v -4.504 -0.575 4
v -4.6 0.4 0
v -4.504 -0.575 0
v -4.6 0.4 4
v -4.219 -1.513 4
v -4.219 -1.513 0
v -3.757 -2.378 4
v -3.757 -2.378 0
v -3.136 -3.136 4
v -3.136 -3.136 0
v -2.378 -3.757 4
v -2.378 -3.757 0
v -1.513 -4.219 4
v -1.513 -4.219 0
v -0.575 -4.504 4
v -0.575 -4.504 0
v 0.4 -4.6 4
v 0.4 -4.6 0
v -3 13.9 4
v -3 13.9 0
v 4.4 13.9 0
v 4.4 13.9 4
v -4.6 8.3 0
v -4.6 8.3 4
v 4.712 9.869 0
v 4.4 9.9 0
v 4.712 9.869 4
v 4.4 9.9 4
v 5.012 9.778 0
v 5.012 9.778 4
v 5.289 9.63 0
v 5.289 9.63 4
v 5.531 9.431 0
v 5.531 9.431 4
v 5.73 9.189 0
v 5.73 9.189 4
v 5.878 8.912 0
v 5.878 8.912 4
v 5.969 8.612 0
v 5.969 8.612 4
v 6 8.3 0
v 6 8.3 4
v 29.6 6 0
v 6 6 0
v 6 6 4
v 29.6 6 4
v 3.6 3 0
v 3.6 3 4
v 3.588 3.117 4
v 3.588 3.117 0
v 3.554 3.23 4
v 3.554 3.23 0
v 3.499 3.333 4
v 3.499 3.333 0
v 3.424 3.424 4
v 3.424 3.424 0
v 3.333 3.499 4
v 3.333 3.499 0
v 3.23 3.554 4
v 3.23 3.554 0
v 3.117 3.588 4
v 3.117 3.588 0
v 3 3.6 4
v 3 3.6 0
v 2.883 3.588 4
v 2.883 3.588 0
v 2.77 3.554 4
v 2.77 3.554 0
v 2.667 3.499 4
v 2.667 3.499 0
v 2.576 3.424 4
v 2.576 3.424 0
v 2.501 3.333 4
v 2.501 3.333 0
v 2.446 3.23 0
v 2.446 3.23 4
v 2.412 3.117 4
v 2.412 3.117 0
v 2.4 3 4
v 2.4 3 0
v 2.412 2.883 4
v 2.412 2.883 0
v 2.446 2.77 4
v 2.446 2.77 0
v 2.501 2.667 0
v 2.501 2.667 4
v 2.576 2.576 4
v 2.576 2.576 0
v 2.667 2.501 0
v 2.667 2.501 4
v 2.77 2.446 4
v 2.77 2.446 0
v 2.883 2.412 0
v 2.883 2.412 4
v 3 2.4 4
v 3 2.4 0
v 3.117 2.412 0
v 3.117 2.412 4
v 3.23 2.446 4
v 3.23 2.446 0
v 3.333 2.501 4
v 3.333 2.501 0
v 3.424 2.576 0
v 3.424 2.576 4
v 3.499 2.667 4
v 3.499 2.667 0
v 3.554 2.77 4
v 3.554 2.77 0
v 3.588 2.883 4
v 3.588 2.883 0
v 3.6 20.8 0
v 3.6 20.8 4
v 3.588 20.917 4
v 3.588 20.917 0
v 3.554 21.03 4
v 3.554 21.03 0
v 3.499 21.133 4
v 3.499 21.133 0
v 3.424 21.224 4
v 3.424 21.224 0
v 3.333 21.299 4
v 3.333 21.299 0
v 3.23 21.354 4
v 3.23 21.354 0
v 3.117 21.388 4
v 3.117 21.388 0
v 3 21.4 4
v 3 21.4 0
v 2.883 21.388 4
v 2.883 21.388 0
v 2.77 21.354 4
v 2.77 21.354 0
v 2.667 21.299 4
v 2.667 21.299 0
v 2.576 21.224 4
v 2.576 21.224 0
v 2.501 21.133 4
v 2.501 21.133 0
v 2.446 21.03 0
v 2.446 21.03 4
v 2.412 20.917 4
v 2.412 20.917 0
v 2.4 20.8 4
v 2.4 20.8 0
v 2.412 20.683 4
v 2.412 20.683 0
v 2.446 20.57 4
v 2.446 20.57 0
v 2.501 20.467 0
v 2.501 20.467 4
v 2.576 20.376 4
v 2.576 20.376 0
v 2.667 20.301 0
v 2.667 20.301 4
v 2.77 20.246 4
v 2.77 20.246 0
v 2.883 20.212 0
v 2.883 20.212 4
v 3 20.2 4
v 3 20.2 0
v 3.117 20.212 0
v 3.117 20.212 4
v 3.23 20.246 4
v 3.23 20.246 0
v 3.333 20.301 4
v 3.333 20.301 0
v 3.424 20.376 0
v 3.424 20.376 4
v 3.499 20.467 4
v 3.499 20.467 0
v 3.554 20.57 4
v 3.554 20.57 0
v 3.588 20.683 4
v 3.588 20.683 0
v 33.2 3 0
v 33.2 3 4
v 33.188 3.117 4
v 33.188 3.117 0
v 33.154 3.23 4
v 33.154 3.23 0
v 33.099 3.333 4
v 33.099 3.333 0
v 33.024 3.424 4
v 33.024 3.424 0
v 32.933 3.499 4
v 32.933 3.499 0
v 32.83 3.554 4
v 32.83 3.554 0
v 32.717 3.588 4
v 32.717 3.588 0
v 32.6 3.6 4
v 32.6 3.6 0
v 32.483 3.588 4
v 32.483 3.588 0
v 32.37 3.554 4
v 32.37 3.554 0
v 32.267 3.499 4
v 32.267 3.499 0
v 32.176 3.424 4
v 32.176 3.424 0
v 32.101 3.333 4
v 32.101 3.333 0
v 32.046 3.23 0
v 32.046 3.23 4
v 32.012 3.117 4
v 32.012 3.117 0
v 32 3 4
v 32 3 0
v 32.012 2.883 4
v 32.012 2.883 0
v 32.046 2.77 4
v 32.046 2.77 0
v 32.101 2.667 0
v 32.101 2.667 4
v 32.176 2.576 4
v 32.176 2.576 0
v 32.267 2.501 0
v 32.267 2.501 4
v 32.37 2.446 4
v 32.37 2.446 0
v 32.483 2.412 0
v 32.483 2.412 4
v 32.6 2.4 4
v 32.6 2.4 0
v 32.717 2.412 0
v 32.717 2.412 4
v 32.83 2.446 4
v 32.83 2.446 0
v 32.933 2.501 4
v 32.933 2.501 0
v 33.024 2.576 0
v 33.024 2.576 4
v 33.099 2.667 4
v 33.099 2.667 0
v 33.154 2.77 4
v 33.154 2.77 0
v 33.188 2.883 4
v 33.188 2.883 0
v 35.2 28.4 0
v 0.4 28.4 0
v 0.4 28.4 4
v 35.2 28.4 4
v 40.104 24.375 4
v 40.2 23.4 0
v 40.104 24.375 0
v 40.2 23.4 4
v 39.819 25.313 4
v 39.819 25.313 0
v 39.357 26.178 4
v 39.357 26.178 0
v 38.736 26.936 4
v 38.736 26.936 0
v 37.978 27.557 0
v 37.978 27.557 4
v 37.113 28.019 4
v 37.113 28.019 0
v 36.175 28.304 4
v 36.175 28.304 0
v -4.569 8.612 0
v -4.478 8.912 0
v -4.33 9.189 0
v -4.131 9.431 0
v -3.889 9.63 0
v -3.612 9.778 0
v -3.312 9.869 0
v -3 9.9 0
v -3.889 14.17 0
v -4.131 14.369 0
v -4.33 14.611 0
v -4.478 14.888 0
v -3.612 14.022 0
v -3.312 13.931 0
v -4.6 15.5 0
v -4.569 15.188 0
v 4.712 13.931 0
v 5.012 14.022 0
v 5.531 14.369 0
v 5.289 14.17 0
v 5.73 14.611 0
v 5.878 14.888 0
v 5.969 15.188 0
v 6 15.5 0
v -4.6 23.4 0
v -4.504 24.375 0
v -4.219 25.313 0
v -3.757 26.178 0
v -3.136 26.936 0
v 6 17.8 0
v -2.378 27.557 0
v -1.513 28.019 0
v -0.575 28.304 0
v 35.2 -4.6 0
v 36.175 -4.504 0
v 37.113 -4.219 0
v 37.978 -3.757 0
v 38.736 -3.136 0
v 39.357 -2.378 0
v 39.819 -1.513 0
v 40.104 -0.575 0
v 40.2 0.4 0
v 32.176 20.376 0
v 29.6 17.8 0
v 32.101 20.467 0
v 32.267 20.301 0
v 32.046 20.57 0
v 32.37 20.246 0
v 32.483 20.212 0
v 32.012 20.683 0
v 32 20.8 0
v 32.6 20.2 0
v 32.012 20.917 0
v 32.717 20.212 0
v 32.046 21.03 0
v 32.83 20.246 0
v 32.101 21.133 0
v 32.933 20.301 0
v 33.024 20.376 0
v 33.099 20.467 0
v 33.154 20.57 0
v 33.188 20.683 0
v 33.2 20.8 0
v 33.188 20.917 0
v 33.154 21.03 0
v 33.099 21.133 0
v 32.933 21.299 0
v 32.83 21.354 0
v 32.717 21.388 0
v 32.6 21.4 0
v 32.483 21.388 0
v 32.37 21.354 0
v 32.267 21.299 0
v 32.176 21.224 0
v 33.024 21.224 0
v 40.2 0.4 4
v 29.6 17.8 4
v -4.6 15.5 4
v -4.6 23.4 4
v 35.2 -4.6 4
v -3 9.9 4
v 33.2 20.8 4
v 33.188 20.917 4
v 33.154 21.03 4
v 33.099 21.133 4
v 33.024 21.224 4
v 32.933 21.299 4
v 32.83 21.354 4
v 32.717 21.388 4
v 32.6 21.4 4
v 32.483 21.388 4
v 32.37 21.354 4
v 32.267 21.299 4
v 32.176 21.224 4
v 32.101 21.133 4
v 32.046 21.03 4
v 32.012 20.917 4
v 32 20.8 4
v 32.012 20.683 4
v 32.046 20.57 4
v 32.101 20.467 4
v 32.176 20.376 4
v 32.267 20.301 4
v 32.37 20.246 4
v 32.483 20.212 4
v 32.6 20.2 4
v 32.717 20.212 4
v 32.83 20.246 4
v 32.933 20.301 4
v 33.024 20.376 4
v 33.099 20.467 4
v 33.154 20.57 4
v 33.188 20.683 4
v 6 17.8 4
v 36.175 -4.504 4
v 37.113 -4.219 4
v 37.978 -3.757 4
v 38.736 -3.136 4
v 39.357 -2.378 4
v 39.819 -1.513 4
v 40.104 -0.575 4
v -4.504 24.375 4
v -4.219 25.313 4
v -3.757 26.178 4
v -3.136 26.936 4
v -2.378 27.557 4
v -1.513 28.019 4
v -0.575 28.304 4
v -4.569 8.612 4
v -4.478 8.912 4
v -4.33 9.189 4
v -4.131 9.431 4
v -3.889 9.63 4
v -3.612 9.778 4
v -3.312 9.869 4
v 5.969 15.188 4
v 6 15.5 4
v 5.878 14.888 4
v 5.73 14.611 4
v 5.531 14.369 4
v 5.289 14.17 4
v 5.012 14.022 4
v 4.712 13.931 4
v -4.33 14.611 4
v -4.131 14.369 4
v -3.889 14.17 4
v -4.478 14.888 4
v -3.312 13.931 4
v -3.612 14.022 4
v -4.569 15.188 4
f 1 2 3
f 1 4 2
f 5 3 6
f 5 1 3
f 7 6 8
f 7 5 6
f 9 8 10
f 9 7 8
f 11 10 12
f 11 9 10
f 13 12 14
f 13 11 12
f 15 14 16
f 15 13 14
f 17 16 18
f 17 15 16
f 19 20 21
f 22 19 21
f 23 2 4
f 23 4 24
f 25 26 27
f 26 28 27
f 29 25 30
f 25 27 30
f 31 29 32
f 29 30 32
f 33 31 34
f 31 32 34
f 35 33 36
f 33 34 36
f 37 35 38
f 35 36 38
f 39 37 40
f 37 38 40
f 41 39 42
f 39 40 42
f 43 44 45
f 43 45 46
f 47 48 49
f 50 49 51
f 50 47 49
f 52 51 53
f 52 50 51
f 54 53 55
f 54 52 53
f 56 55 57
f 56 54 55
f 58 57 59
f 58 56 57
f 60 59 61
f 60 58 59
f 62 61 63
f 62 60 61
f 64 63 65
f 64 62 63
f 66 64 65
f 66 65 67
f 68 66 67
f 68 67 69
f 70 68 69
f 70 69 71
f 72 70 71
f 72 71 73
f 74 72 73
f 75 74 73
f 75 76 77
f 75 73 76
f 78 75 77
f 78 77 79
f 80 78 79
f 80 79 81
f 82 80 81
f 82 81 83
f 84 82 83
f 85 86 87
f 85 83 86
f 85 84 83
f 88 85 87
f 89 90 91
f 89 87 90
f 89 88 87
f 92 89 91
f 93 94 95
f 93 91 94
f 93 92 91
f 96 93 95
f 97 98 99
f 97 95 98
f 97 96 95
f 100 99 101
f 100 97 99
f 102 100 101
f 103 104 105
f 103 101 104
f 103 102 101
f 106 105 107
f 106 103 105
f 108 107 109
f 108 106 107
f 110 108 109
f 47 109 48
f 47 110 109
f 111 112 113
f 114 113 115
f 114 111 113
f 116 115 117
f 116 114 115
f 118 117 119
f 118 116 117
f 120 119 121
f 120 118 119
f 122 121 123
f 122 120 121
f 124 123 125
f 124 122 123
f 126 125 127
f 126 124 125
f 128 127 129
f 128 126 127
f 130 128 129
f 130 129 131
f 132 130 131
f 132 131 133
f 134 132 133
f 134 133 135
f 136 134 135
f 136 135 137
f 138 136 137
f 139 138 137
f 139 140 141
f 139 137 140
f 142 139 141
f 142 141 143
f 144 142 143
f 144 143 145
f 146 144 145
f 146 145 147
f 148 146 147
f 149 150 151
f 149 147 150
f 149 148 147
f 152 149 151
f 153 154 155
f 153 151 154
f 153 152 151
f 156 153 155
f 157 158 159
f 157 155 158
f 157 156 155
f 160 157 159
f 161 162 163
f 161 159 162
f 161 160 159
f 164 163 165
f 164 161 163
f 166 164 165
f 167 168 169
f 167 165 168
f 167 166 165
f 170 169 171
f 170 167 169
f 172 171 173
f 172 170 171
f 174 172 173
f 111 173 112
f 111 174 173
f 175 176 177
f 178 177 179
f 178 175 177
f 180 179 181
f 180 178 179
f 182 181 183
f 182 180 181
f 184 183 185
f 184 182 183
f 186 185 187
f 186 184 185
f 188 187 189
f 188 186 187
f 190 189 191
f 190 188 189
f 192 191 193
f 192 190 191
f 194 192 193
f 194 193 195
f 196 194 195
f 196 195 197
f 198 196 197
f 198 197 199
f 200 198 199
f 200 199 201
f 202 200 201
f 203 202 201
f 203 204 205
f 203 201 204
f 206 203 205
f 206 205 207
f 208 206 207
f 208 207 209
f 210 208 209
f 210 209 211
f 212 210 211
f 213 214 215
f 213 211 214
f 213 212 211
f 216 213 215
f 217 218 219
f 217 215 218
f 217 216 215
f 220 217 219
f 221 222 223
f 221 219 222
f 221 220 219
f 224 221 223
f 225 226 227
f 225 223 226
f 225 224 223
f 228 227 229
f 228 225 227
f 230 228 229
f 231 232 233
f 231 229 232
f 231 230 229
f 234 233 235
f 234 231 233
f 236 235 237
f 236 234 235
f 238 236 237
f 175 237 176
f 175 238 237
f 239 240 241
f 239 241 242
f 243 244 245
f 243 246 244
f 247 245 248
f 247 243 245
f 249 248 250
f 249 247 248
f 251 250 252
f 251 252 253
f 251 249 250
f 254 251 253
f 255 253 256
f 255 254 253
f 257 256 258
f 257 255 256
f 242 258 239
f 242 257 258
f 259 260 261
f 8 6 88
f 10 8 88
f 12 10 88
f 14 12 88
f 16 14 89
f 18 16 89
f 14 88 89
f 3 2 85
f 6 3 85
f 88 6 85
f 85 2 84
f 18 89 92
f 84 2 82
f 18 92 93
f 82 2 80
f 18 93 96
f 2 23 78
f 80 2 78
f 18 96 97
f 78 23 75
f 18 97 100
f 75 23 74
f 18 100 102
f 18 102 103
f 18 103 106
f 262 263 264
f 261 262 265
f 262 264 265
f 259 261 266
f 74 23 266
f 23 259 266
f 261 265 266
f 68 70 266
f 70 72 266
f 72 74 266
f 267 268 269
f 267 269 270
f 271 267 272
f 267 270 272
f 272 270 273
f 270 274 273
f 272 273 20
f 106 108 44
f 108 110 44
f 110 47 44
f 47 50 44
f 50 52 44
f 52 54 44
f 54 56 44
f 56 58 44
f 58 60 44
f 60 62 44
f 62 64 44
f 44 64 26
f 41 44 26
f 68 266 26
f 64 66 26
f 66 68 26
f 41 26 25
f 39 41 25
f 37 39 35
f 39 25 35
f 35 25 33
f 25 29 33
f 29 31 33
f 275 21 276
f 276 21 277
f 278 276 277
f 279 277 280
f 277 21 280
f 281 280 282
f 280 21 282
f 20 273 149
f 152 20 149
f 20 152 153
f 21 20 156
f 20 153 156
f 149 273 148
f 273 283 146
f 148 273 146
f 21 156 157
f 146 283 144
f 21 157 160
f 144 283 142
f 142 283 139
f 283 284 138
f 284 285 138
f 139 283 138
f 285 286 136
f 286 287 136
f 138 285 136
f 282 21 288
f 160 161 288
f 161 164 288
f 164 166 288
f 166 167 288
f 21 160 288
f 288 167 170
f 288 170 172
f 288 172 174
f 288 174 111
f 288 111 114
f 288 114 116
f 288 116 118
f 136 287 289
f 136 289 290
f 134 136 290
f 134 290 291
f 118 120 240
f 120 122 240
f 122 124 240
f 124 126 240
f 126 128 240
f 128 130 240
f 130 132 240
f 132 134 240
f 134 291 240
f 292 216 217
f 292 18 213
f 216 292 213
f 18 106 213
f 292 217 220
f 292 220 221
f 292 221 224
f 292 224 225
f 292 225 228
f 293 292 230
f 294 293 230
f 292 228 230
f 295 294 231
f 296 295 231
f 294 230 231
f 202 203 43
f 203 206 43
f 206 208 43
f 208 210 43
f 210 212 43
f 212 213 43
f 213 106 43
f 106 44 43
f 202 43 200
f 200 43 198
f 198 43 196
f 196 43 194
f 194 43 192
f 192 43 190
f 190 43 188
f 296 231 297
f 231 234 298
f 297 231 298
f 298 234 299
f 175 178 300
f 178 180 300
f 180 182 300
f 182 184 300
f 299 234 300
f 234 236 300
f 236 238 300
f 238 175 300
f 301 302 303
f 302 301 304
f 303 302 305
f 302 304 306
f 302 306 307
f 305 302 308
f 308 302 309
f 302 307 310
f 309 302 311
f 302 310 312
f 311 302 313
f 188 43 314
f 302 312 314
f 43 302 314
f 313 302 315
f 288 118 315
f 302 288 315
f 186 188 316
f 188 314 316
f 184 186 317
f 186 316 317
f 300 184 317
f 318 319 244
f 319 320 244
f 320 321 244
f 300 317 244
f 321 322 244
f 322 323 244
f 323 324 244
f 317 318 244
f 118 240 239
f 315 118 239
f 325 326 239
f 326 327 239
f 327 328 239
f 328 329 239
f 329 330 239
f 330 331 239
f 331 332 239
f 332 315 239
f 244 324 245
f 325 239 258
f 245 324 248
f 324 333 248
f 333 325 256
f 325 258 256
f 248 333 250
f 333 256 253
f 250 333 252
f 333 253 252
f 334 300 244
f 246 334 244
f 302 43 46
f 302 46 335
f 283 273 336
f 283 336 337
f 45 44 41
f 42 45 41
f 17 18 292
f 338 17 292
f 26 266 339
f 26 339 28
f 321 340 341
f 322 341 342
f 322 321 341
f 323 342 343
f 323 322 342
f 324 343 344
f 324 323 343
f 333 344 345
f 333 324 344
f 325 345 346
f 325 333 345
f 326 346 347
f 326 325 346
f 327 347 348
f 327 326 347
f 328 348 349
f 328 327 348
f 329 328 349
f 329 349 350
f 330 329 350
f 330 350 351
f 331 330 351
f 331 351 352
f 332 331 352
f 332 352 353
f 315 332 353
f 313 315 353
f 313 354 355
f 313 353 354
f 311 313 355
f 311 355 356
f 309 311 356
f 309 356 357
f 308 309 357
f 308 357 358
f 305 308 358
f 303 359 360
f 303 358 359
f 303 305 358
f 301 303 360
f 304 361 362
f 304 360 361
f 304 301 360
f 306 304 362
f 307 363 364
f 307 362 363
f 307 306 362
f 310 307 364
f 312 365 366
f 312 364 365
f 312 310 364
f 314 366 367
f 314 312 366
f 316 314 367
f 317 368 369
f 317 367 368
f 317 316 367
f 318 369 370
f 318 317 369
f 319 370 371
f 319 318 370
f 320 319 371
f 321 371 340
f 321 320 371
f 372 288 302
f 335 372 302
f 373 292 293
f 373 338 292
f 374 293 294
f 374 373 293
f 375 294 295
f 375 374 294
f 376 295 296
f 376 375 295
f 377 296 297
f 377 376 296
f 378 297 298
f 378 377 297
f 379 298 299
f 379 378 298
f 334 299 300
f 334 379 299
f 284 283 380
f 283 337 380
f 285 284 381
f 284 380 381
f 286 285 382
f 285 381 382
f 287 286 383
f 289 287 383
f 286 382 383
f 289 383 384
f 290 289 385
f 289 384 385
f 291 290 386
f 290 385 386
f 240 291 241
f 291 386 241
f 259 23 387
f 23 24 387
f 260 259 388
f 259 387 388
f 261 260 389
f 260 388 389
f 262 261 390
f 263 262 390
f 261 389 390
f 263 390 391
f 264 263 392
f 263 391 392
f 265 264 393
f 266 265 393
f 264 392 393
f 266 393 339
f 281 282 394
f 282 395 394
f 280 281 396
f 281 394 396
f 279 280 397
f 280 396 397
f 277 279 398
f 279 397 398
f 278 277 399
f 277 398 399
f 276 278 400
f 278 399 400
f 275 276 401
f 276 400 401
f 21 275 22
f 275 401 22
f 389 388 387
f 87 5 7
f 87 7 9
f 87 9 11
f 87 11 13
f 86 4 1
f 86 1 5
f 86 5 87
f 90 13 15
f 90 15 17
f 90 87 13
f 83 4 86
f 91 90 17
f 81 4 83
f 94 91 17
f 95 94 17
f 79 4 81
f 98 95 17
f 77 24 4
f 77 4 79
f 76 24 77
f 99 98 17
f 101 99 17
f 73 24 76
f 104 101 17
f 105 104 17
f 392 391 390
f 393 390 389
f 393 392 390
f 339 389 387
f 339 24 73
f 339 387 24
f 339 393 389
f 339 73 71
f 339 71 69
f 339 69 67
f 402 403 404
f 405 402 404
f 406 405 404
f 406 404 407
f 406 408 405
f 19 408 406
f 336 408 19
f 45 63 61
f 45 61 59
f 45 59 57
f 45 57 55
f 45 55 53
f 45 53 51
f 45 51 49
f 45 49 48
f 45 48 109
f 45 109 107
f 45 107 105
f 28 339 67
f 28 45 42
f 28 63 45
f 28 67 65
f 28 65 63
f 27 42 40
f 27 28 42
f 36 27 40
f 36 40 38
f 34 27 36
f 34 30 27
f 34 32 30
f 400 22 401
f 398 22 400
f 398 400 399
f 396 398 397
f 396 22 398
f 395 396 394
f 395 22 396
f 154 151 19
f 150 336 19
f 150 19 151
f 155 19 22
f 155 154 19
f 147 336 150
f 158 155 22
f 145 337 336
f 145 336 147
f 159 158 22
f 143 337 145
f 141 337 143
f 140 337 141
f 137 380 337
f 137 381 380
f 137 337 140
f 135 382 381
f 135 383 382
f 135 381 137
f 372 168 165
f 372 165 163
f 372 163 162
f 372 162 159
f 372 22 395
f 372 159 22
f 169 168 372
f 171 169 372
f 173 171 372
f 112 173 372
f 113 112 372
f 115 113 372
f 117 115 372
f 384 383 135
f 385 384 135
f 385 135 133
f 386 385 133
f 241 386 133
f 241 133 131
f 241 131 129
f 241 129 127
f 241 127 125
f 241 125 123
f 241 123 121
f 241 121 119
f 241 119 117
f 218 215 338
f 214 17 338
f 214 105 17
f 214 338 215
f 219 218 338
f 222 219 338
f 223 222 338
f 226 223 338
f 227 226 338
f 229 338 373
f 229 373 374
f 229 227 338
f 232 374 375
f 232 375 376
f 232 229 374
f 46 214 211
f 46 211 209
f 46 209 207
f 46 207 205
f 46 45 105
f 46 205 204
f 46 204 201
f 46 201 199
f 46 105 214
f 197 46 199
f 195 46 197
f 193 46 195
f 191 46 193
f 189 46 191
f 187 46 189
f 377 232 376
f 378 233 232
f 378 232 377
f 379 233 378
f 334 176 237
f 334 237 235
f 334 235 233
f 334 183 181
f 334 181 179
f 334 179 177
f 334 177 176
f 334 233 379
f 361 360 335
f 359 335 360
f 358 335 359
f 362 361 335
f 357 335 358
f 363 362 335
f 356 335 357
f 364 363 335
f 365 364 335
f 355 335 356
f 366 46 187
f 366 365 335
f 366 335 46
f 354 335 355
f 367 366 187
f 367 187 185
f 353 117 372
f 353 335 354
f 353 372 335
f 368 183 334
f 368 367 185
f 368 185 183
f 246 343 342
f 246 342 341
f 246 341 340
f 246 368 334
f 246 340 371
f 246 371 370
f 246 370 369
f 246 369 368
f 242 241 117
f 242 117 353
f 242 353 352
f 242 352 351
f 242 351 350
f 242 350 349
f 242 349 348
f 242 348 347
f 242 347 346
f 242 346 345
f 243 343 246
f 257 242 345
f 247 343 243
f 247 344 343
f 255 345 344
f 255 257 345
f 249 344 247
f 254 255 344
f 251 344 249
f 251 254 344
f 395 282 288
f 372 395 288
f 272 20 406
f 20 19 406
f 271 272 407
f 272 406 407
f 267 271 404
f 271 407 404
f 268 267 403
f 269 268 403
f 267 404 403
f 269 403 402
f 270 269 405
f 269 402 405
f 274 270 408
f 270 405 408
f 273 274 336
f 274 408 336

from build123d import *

# Parameters (mm, degrees)
BOX014_W          = 23.6
BOX014_H          = 11.8
BOX014_DEPTH      = 10
BOX015_W          = 10.6
BOX015_H          = 4
BOX015_DEPTH      = 10
CYLINDER007_R     = 0.6
CYLINDER007_DEPTH = 10
ARRAY009_X_COUNT  = 2
ARRAY009_X_PITCH  = 29.6
ARRAY009_Y_COUNT  = 2
ARRAY009_Y_PITCH  = 17.8
BOX012_W          = 44.8
BOX012_H          = 33
BOX012_DEPTH      = 4
FILLET_R          = 5
FILLET003003_R    = 1.6


with BuildPart() as base_extraction_cube:
    # Box014 → Box014 (new body)
    with BuildSketch(Plane(origin=(6, 6, 0), x_dir=(1, 0, 0), z_dir=(0, 0, 1))):
        with Locations((11.8, 5.9)):
            Rectangle(BOX014_W, BOX014_H)
    extrude(amount=BOX014_DEPTH)


with BuildPart() as wire_channel:
    # Box015 → Box015 (new body)
    with BuildSketch(Plane(origin=(-4.6, 9.9, 0), x_dir=(1, 0, 0), z_dir=(0, 0, 1))):
        with Locations((5.3, 2)):
            Rectangle(BOX015_W, BOX015_H)
    extrude(amount=BOX015_DEPTH)


with BuildPart() as base_extract_fusion:
    # Cylinder007 → Cylinder007 (new body)
    with BuildSketch(Plane.XY):
        Circle(CYLINDER007_R)
    extrude(amount=CYLINDER007_DEPTH)

    # Array009 X: base extract fusion ×2


with BuildPart() as base_extract_fusion_1:
    add(base_extract_fusion.part)
    with Locations(*[(i * ARRAY009_X_PITCH, 0, 0) for i in range(1, ARRAY009_X_COUNT)]):
        add(base_extract_fusion.part)

    # Array009 Y: base extract fusion ×2


with BuildPart() as base_extract_fusion_2:
    add(base_extract_fusion_1.part)
    with Locations(*[(0, i * ARRAY009_Y_PITCH, 0) for i in range(1, ARRAY009_Y_COUNT)]):
        add(base_extract_fusion_1.part)


with BuildPart() as base_extract_fusion_3:
    # Array009 placement: moved
    add(base_extract_fusion_2.part.moved(Location((3, 3, 0))))

    # Fusion010: union base extraction cube, wire channel
    add(base_extraction_cube.part)
    add(wire_channel.part)


with BuildPart() as base_cut_fillet_no_ears:
    # Box012 → Box012 (new body)
    with BuildSketch(Plane(origin=(-4.6, -4.6, 0), x_dir=(1, 0, 0), z_dir=(0, 0, 1))):
        with Locations((22.4, 16.5)):
            Rectangle(BOX012_W, BOX012_H)
    extrude(amount=BOX012_DEPTH)

    # Fillet
    fillet_edges = [base_cut_fillet_no_ears.edges().sort_by_distance(p)[0] for p in [
        (-4.6, -4.6, 2),
        (-4.6, 28.4, 2),
        (40.2, -4.6, 2),
        (40.2, 28.4, 2),
    ]]
    fillet(fillet_edges, radius=FILLET_R)

    # Cut002003: cut base extract fusion
    add(base_extract_fusion_3.part, mode=Mode.SUBTRACT)

    # Fillet003003
    fillet003003_edges = [base_cut_fillet_no_ears.edges().sort_by_distance(p)[0] for p in [
        (-4.6, 9.9, 2),
        (6, 9.9, 2),
        (6, 13.9, 2),
        (-4.6, 13.9, 2),
    ]]
    fillet(fillet003003_edges, radius=FILLET003003_R)


solid = base_cut_fillet_no_ears.part
